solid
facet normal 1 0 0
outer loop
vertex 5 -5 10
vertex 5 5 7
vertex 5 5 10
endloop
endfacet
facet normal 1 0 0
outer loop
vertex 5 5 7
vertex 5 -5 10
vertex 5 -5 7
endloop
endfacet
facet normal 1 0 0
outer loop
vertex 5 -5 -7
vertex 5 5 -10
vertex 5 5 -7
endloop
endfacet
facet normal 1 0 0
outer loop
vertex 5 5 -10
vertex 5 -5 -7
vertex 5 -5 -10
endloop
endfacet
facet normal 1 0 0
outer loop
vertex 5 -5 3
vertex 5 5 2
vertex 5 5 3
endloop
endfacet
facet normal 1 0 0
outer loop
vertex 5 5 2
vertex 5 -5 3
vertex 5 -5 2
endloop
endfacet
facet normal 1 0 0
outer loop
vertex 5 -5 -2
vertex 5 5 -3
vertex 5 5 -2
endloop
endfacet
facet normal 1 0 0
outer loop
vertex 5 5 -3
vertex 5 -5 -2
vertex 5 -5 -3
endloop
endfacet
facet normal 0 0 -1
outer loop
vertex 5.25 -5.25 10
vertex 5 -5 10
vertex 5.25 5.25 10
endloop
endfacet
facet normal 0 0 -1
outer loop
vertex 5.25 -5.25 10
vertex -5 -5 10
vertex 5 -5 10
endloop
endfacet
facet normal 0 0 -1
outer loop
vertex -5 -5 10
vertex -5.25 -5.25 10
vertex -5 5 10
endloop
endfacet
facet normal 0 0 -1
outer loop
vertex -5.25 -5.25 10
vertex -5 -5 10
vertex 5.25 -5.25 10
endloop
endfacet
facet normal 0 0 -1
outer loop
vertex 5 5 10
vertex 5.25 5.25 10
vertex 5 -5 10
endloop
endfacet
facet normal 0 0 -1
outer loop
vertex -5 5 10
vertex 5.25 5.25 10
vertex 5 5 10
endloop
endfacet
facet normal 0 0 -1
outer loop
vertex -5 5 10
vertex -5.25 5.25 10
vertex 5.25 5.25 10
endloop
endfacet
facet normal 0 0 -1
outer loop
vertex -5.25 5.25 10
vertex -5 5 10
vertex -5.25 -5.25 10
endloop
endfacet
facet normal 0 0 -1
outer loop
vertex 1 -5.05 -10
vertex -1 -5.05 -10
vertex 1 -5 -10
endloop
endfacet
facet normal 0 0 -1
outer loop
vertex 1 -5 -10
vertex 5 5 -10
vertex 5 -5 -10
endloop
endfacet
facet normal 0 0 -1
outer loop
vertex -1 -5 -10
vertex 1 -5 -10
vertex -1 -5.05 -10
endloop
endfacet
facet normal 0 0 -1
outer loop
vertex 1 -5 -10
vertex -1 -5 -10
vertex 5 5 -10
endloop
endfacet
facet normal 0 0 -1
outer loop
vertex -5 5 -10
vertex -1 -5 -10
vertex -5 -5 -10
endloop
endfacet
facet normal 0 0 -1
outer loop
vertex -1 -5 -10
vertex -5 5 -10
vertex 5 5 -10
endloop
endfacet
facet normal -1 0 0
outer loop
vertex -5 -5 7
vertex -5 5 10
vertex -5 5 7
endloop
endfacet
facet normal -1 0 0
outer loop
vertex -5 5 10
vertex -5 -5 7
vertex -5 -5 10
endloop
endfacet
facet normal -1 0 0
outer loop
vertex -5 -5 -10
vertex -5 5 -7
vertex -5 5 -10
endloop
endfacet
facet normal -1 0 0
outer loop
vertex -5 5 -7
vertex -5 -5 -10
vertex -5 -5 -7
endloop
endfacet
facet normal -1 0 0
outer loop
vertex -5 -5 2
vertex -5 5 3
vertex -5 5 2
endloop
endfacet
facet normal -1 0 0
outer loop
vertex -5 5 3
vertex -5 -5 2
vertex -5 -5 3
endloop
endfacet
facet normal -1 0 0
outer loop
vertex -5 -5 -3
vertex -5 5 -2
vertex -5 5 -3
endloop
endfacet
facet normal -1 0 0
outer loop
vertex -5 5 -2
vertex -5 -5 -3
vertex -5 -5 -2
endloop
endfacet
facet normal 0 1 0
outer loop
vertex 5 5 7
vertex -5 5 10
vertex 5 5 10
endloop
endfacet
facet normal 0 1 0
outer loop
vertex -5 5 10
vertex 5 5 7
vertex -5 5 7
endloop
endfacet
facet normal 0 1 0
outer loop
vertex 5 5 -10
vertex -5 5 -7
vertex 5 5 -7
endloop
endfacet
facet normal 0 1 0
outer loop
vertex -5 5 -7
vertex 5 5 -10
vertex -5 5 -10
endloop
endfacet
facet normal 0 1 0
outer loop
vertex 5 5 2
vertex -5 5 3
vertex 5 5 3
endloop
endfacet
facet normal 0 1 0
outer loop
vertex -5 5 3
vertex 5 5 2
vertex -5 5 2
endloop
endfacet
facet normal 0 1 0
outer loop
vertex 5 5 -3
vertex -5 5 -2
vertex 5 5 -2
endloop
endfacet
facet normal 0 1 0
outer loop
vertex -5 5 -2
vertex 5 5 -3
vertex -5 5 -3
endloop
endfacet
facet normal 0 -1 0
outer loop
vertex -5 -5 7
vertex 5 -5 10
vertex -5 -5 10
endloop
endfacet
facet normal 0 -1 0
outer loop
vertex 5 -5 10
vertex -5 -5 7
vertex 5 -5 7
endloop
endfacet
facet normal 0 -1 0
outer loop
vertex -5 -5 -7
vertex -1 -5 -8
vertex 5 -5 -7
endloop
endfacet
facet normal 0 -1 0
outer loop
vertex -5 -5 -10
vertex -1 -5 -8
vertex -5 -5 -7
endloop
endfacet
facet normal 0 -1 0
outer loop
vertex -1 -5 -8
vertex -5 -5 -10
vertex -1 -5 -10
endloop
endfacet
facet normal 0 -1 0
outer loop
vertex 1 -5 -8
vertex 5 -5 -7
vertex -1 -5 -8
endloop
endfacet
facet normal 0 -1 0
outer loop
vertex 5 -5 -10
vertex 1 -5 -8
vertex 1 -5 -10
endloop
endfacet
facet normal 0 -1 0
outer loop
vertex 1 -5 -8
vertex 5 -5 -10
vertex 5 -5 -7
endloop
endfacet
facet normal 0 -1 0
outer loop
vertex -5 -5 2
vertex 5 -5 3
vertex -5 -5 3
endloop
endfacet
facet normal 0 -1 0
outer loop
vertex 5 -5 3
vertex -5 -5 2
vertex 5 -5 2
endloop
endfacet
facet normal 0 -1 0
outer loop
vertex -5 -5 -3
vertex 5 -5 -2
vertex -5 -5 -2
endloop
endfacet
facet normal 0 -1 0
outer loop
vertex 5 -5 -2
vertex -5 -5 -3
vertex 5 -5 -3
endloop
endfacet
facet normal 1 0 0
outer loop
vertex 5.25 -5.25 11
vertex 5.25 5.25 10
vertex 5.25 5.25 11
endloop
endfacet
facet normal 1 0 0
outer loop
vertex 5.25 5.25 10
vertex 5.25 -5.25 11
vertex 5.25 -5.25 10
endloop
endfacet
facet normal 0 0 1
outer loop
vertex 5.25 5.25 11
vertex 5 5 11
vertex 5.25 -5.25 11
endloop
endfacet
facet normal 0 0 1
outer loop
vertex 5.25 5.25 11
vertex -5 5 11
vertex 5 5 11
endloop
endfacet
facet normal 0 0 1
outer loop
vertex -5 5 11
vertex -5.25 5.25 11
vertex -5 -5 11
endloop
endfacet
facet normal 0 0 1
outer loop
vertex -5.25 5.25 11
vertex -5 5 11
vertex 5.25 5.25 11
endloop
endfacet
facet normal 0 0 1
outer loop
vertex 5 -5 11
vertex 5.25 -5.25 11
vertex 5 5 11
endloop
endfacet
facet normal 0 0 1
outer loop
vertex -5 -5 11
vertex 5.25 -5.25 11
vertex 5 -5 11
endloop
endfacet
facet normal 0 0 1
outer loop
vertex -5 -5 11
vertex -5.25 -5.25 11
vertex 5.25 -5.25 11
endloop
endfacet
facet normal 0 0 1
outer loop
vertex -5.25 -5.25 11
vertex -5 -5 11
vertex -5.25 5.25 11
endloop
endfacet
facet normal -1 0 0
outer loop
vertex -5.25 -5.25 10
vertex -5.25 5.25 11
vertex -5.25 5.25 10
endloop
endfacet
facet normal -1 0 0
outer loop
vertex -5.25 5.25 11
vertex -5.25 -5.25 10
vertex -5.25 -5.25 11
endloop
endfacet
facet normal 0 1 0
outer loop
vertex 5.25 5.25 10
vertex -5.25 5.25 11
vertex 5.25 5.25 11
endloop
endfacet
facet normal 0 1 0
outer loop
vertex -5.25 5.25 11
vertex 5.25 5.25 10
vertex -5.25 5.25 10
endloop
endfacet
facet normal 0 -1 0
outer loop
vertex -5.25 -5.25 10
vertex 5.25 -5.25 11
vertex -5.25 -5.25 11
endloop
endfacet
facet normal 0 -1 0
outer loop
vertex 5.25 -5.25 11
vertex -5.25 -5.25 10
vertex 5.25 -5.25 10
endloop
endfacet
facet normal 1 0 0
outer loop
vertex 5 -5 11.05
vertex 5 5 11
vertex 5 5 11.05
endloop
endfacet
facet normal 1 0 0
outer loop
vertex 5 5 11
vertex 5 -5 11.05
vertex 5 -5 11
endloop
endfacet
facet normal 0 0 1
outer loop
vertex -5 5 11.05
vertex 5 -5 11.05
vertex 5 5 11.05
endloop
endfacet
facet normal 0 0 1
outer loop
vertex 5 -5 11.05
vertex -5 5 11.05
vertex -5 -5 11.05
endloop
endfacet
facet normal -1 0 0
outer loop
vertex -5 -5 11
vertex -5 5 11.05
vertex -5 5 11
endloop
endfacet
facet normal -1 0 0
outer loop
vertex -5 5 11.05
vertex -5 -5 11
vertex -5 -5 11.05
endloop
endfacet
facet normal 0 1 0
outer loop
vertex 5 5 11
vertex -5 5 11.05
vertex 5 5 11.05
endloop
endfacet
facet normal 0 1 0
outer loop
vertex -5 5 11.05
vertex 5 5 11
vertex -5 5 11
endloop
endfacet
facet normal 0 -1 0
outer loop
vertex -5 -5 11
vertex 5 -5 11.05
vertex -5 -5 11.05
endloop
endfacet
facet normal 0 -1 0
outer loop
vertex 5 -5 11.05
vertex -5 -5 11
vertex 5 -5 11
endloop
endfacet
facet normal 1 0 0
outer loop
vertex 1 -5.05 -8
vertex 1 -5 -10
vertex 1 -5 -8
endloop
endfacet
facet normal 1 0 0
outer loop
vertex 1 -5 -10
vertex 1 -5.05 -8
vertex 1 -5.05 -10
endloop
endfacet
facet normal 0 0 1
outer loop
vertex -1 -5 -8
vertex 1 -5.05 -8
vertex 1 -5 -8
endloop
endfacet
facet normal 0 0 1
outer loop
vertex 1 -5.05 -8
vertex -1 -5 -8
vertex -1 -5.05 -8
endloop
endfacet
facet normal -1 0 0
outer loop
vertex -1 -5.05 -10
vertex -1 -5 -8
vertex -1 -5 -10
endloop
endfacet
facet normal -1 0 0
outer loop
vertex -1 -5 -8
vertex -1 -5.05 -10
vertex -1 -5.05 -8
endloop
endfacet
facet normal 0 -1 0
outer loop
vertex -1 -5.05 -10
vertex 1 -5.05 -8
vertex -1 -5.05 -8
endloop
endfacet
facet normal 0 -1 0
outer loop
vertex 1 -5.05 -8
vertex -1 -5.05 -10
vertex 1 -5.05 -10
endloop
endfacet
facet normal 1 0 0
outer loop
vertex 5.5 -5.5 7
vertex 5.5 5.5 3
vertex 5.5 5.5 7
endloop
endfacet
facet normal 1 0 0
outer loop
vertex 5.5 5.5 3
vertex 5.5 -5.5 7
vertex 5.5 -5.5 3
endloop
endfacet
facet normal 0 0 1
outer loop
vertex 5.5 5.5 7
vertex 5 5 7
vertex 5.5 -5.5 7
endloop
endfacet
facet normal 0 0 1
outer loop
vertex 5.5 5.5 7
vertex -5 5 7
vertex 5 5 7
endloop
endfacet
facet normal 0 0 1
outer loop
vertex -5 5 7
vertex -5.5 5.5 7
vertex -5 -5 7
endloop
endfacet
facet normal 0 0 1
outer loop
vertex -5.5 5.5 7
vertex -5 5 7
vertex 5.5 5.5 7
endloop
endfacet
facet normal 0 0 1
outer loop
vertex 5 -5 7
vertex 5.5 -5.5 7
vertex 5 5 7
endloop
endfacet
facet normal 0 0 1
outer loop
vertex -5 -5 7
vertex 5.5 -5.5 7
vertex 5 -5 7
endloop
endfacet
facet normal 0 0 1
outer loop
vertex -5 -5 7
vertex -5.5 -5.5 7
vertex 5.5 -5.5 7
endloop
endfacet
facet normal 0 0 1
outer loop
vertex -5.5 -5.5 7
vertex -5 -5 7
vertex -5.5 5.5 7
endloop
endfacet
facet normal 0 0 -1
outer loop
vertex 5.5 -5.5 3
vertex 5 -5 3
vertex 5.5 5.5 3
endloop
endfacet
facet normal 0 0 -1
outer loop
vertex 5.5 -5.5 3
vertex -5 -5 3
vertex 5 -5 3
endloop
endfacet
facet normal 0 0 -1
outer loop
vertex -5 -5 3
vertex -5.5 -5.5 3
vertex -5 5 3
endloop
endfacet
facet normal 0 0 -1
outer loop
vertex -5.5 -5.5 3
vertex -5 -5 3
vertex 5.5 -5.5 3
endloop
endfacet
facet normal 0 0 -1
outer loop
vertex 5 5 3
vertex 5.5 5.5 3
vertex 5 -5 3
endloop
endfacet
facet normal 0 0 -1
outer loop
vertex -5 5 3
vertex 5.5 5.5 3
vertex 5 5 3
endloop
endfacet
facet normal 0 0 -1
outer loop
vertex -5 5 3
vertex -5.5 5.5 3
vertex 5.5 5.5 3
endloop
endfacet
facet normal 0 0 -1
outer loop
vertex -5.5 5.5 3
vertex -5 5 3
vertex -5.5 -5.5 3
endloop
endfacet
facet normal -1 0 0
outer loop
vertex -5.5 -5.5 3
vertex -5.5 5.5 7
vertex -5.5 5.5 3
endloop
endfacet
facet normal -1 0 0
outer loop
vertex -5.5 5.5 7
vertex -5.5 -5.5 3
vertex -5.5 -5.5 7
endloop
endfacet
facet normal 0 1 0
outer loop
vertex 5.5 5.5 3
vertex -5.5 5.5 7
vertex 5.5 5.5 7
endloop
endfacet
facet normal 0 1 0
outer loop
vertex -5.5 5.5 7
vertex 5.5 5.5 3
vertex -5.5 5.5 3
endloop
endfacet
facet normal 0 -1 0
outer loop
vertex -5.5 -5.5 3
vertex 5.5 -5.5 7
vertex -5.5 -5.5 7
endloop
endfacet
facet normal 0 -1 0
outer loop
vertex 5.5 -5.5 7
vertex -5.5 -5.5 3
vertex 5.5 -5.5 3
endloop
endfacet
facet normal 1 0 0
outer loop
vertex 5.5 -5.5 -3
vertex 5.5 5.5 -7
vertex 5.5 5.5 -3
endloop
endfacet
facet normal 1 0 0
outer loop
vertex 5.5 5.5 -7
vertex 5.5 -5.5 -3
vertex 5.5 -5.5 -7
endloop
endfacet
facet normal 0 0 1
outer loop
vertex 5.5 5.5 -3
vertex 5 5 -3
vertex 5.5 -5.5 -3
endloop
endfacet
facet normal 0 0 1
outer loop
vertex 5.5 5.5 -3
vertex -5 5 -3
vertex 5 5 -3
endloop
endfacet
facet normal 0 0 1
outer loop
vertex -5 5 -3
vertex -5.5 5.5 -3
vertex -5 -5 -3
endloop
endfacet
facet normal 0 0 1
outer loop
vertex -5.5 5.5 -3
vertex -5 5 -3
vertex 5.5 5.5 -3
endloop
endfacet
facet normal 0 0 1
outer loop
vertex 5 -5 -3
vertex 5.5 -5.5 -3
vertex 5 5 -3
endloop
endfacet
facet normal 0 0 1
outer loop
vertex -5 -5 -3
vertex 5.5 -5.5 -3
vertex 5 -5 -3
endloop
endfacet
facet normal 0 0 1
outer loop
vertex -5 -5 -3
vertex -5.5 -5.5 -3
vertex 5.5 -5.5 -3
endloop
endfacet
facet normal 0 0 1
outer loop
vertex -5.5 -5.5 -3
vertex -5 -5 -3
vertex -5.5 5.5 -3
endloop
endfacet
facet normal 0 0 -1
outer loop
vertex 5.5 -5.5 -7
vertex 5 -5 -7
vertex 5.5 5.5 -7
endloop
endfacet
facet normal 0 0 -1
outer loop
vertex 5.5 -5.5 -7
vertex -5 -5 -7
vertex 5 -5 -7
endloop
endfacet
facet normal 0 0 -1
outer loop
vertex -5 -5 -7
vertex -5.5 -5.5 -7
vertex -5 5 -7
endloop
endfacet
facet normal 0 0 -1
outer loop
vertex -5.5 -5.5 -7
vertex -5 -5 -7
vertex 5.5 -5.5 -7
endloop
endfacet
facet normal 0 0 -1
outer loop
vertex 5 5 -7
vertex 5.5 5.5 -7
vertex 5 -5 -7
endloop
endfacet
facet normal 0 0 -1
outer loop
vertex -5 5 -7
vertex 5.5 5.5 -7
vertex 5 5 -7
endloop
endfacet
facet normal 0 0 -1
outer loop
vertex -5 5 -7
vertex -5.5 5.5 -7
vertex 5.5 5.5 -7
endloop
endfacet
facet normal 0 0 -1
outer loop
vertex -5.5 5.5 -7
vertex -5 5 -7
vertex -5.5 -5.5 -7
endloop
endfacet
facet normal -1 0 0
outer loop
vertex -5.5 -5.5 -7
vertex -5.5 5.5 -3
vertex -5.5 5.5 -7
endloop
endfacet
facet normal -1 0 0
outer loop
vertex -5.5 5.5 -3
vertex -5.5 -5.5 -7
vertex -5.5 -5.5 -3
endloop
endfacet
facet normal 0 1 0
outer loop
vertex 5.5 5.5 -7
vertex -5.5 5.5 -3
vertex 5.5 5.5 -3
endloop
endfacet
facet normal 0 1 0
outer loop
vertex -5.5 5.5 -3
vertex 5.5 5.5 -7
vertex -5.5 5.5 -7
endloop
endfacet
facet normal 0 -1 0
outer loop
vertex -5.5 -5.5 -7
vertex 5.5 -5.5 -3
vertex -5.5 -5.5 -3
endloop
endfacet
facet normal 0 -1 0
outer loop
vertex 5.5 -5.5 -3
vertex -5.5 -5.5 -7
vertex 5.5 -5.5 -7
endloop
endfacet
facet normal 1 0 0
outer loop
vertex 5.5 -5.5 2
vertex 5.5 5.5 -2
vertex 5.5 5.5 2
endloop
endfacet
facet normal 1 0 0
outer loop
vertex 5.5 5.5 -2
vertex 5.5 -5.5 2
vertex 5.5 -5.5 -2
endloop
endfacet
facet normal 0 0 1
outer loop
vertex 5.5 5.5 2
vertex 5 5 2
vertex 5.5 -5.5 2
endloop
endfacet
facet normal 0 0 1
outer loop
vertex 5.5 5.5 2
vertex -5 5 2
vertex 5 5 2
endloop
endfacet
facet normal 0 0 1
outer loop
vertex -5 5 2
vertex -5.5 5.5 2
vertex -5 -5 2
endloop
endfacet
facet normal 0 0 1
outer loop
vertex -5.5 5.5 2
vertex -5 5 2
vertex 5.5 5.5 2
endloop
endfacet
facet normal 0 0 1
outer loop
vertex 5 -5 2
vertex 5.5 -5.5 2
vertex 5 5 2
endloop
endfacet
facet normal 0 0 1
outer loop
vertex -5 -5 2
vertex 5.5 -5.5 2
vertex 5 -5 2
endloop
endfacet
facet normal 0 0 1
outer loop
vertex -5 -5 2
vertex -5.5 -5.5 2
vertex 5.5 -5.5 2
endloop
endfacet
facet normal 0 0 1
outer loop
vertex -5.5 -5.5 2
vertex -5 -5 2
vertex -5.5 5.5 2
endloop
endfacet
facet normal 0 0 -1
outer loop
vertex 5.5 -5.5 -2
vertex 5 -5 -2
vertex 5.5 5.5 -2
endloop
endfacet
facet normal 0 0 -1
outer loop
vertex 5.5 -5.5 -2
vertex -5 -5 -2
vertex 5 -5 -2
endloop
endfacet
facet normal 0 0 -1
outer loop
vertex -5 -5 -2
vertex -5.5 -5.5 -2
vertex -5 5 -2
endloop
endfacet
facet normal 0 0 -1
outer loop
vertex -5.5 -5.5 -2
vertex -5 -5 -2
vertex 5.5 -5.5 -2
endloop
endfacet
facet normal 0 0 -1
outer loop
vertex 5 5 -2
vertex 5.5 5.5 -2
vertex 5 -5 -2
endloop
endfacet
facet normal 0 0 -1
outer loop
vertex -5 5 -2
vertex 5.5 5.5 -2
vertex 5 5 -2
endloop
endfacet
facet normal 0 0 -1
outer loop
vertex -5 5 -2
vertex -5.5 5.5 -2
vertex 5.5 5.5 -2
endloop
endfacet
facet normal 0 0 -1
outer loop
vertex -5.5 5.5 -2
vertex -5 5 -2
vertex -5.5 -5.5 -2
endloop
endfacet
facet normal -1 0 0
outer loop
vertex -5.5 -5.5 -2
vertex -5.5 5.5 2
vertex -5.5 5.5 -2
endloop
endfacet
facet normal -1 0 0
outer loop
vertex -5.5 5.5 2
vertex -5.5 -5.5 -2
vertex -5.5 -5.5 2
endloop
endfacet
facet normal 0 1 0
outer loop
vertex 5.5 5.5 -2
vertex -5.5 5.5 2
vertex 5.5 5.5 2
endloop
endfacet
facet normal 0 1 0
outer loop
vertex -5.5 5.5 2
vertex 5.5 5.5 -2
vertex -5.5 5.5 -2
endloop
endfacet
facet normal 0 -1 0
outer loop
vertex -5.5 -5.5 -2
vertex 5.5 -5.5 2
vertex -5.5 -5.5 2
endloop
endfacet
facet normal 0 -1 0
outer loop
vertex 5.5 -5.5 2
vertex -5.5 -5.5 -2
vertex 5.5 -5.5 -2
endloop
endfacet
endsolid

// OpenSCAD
module Building_01(){

    union(){
        color("#132919")
        cube([10,10,20],center=true);
        
        translate([0,0,10.5])
        color("#a59f8b")
        cube([10.5,10.5,1],center=true);

        translate([0,0,11])
        color("#d1c093")
        cube([10,10,0.1],center=true);

        color("#a59f8b")
        translate([0,-5,-9])
        cube([2,0.1,2],center=true);

        translate([0,0,5])
        color("#9fcbd0")
        cube([11,11,4],center=true);

        translate([0,0,-5]){
        color("#9fcbd0")
        cube([11,11,4],center=true);
        }

        translate([0,0,0]){
        color("#9fcbd0")
        cube([11,11,4],center=true);
        }

    }

}

Building_01();

// Written by Nicolì Angelo (Gengio) 2024: 
// MIT License

//Permission is hereby granted, free of charge, to any person obtaining a copy of this software and associated documentation files (the "Software"), to deal in the Software without restriction, including without limitation the rights to use, copy, modify, merge, publish, distribute, sublicense, and/or sell copies of the Software, and to permit persons to whom the Software is furnished to do so, subject to the following conditions:

//The above copyright notice and this permission notice shall be included in all copies or substantial portions of the Software.

//THE SOFTWARE IS PROVIDED "AS IS", WITHOUT WARRANTY OF ANY KIND, EXPRESS OR IMPLIED, INCLUDING BUT NOT LIMITED TO THE WARRANTIES OF MERCHANTABILITY, FITNESS FOR A PARTICULAR PURPOSE AND NONINFRINGEMENT. IN NO EVENT SHALL THE AUTHORS OR COPYRIGHT HOLDERS BE LIABLE FOR ANY CLAIM, DAMAGES OR OTHER LIABILITY, WHETHER IN AN ACTION OF CONTRACT, TORT OR OTHERWISE, ARISING FROM, OUT OF OR IN CONNECTION WITH THE SOFTWARE OR THE USE OR OTHER DEALINGS IN THE SOFTWARE.
